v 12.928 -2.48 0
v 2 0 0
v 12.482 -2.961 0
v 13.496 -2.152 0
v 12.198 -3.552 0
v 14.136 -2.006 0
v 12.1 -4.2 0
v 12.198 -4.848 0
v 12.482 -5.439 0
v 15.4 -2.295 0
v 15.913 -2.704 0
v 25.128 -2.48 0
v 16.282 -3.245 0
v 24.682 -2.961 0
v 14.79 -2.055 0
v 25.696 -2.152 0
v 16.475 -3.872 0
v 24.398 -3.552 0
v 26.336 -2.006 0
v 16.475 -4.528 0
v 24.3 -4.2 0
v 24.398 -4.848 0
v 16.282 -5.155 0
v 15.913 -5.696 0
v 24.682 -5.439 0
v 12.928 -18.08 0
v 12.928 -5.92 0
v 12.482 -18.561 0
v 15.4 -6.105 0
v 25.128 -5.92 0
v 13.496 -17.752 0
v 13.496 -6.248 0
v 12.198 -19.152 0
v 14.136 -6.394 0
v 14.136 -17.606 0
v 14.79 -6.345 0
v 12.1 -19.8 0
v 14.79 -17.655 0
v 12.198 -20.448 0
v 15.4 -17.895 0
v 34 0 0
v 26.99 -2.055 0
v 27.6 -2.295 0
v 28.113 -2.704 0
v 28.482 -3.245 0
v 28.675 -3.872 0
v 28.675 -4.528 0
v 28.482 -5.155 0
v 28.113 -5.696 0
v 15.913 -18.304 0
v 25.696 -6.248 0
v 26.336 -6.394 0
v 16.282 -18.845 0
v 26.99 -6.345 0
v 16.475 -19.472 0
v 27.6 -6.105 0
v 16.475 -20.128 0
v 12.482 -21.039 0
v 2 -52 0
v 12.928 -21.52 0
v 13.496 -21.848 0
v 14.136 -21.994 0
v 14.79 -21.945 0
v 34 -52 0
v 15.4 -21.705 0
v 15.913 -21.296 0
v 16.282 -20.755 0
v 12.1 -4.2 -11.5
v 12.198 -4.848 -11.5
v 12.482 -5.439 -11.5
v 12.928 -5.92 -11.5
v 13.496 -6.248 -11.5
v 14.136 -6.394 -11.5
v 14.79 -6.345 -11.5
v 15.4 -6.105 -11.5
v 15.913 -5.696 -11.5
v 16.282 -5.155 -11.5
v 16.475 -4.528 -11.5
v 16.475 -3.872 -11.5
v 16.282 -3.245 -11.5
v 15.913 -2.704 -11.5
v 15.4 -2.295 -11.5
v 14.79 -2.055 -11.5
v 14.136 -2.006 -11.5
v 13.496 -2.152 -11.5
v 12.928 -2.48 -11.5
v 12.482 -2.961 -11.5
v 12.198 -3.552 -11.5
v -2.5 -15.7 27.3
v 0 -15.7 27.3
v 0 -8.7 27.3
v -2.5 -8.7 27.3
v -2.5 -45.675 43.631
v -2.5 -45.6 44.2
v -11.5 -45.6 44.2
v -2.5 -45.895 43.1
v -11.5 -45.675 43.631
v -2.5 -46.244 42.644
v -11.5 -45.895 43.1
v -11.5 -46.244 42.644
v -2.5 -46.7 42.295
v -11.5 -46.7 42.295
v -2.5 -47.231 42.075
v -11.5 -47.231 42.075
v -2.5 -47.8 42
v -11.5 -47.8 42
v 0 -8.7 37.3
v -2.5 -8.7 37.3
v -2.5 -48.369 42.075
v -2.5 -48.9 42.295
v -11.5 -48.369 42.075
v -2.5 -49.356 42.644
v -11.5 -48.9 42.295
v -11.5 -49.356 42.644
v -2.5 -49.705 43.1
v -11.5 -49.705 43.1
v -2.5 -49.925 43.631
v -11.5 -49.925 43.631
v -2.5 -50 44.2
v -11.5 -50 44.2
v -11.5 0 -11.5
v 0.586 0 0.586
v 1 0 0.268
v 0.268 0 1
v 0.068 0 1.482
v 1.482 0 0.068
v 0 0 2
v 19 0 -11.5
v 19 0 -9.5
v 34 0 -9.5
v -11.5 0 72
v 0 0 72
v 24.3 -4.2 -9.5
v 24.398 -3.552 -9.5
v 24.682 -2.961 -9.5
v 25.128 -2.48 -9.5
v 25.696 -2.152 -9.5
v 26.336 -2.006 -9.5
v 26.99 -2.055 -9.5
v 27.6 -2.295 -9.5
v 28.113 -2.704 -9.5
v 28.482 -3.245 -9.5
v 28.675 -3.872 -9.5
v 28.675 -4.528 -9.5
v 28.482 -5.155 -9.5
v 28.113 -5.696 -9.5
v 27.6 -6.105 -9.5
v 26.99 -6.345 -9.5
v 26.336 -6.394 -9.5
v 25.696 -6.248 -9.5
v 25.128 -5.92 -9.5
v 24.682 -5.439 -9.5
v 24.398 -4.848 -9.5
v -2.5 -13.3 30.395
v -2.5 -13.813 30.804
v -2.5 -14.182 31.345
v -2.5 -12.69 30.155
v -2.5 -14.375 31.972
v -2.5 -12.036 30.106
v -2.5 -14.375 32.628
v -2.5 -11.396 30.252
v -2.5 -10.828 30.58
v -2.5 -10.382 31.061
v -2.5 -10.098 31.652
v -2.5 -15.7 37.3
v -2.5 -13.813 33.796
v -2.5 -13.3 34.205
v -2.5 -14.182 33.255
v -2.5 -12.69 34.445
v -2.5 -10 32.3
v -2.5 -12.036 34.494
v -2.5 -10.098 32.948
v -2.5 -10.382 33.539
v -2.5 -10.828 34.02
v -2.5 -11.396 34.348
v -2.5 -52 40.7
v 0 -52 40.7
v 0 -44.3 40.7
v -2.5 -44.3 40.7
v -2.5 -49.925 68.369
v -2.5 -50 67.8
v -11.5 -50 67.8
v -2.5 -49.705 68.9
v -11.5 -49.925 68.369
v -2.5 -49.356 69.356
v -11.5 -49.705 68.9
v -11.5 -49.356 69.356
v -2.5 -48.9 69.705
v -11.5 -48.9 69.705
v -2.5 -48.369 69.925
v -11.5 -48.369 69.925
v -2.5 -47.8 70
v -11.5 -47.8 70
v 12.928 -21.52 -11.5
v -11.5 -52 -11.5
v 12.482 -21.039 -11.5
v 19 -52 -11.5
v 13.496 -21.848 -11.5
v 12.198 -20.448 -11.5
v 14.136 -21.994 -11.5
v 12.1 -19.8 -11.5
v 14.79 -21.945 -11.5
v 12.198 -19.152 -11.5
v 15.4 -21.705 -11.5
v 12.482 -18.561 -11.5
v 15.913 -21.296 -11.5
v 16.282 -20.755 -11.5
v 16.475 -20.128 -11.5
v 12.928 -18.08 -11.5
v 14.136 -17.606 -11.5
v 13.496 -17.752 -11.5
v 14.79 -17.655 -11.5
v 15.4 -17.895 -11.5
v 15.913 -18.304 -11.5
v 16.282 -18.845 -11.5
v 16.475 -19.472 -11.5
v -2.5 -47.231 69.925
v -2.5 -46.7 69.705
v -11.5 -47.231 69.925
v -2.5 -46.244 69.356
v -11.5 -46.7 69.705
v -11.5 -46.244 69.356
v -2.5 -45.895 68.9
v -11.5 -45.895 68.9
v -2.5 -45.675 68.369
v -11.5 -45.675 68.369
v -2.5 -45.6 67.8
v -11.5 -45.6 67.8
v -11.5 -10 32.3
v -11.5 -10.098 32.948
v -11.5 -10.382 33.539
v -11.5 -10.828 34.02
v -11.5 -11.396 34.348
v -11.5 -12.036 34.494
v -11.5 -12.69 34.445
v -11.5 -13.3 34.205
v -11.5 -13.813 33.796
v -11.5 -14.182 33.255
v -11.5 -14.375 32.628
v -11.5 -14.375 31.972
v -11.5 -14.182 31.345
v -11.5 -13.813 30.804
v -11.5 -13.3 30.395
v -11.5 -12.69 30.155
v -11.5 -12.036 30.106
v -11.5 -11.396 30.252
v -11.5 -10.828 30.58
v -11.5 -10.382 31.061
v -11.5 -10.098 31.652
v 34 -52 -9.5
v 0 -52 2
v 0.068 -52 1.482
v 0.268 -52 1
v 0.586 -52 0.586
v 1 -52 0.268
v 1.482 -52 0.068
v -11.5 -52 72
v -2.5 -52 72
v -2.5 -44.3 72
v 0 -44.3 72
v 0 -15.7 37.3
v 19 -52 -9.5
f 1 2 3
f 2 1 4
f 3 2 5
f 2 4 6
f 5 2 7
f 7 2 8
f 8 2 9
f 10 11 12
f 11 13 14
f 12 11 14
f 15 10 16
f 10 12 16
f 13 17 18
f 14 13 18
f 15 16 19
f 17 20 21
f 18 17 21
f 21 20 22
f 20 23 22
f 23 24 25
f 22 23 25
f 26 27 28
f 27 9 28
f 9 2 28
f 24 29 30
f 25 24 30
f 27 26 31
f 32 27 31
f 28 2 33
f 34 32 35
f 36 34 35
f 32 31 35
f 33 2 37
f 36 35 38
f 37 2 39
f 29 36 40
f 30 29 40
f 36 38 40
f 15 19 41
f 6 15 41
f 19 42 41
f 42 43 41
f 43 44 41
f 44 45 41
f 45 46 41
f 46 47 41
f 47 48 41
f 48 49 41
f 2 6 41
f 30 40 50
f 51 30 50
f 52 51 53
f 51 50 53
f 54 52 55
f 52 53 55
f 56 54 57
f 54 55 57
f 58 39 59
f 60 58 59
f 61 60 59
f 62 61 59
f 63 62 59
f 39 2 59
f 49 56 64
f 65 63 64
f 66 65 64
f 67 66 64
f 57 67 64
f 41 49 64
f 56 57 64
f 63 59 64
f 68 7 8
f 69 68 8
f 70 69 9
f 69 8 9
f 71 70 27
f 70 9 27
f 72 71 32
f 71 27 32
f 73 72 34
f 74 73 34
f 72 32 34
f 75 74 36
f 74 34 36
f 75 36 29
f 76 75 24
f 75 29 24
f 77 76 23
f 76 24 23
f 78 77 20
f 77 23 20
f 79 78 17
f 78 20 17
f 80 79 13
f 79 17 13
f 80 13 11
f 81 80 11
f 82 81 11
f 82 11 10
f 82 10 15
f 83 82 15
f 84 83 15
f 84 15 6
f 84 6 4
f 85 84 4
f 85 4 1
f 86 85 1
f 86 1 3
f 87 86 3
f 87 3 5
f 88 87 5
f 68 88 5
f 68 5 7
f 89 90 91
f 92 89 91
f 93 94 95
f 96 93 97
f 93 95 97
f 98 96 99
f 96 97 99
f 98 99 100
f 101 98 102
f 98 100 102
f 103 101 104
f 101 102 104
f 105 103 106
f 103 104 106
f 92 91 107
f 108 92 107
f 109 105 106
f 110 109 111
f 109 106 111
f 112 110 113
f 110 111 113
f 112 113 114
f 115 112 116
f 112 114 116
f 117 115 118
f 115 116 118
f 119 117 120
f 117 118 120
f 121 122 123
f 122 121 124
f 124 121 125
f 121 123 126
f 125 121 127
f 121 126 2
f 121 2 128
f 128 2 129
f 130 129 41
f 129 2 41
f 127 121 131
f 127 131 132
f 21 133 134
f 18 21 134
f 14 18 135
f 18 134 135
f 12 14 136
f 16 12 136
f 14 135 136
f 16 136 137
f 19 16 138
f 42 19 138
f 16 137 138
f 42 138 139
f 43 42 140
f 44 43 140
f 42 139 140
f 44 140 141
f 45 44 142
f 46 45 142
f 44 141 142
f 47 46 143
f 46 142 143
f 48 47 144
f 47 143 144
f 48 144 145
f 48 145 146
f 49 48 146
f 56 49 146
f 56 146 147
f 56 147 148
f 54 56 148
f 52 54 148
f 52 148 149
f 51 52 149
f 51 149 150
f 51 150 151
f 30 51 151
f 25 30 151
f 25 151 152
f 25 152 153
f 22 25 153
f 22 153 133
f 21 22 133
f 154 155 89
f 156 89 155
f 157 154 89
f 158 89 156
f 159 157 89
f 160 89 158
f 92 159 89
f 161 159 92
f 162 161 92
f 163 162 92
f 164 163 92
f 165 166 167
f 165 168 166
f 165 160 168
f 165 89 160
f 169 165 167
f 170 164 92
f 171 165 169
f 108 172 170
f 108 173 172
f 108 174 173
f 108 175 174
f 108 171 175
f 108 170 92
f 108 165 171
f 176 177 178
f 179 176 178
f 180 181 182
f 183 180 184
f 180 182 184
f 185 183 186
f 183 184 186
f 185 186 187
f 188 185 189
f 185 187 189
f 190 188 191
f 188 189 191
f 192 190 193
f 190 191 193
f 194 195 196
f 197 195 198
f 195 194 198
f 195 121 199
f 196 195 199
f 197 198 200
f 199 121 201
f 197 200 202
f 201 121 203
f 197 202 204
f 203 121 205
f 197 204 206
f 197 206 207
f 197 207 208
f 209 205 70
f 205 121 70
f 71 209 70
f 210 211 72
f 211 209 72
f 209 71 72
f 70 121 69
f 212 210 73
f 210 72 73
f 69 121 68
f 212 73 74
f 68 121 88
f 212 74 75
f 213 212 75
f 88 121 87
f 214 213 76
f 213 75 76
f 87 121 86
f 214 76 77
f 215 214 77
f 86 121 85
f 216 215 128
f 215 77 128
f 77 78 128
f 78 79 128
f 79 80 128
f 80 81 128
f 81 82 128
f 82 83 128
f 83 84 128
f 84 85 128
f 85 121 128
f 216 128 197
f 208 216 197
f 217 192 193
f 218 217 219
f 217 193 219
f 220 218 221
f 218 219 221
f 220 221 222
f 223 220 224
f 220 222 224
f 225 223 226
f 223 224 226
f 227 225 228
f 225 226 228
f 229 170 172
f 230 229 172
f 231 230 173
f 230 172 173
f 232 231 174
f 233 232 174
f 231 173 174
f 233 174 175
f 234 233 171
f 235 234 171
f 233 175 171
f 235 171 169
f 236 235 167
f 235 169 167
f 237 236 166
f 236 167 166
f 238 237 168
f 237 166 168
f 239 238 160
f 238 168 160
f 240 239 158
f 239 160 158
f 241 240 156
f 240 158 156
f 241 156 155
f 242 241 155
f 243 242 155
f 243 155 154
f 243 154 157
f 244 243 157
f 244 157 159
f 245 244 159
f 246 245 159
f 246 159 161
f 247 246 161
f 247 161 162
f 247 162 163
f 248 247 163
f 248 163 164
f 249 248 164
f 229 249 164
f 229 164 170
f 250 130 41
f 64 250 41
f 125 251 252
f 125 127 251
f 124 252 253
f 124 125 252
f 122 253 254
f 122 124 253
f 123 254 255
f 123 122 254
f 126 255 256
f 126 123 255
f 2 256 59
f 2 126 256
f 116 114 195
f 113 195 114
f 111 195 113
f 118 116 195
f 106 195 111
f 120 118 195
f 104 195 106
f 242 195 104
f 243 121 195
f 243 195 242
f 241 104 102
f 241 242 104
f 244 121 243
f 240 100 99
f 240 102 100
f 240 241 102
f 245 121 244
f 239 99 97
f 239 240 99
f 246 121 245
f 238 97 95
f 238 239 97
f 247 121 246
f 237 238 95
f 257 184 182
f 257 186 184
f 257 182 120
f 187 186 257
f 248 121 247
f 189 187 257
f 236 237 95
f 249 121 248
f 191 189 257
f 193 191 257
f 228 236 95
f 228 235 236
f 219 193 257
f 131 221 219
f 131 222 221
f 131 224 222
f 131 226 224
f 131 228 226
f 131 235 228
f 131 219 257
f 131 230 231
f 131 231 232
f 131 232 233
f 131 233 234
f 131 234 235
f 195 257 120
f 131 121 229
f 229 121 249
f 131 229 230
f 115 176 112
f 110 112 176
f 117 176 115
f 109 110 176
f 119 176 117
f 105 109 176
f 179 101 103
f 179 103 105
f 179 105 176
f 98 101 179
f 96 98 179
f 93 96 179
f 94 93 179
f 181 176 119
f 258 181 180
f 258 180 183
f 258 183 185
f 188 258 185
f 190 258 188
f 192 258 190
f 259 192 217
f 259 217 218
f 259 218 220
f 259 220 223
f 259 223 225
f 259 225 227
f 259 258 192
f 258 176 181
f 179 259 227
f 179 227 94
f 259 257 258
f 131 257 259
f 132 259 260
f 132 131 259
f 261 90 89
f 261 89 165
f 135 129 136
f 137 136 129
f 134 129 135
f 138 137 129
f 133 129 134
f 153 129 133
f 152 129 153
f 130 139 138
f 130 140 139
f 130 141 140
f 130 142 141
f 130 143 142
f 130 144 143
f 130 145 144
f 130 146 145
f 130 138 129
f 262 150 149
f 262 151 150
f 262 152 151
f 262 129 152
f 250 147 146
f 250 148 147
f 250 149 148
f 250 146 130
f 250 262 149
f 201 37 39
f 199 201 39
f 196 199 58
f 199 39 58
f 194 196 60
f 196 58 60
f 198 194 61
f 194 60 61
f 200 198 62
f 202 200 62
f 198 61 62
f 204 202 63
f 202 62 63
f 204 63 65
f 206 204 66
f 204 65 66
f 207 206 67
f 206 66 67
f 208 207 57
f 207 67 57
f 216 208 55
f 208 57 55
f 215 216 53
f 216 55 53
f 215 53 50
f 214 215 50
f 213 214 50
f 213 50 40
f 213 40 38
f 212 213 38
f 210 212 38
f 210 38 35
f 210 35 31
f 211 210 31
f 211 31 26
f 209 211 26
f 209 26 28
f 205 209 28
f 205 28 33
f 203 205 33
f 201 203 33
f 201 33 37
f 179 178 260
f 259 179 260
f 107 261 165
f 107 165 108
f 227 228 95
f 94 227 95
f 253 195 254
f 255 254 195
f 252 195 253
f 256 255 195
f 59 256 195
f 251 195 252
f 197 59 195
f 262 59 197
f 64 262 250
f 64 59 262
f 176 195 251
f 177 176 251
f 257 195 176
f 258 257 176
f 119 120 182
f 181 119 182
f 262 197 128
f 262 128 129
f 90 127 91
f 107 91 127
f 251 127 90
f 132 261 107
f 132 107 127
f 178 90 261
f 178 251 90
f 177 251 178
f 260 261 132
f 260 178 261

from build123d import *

# Parameters (mm, degrees)
F0_W        = 45.5
F0_H        = 83.5
F1_DEPTH    = 52
F2_W        = 34
F2_H        = 72
F3_DEPTH    = 52.001
F5_W        = 15
F5_H        = 2
F6_DEPTH    = 52.001
F8_R        = 2
F10_D       = 4.4
F10_ON_F9_D = 4.4
F10_ON_F4_D = 4.4
F12_DEPTH   = 45.501
F13_W       = 7
F13_H       = 10
F14_DEPTH   = 2.5
F15_W       = 7.7
F15_H       = 31.3
F16_DEPTH   = 2.5


# Not quite as in the source:
# - a feature names something its author has since deleted; it is built from what else it names


with BuildPart() as f1:
    # F0 (on Front) → F1 (new body)
    with BuildSketch(Plane.XZ):
        with Locations((11.25, 30.25)):
            Rectangle(F0_W, F0_H)
    extrude(amount=F1_DEPTH)

    # F2 (on face) → F3 (cut, through all)
    with BuildSketch(Plane.XZ.offset(52)):
        with Locations((17, 36)):
            Rectangle(F2_W, F2_H)
    extrude(amount=-F3_DEPTH, mode=Mode.SUBTRACT)

    # F5 (on face) → F6 (cut, through all)
    with BuildSketch(Plane.XZ.offset(52)):
        with Locations((26.5, -10.5)):
            Rectangle(F5_W, F5_H)
    extrude(amount=-F6_DEPTH, mode=Mode.SUBTRACT)

    # F8
    f8_edges = [f1.edges().sort_by_distance(p)[0] for p in [
        (0, -26, 0),
    ]]
    fillet(f8_edges, radius=F8_R)

    # F10 (through all)
    with Locations(Plane.XY):
        with Locations((26.5, -4.2)):
            Hole(F10_D / 2)

    # F10 on F9 (through all)
    with Locations(Plane(origin=(-11.5, 0, 0), x_dir=(0, -1, 0), z_dir=(-1, 0, 0))):
        with Locations((12.2, 32.3)):
            Hole(F10_ON_F9_D / 2)

    # F10 on F4 (through all)
    with Locations(Plane(origin=(0, 0, -11.5), x_dir=(1, 0, 0), z_dir=(0, 0, -1))):
        with Locations((14.3, 19.8), (14.3, 4.2)):
            Hole(F10_ON_F4_D / 2)

    # F11 (on face) → F12 (cut, through all)
    with BuildSketch(Plane(origin=(-11.5, 0, 0), x_dir=(0, -1, 0), z_dir=(-1, 0, 0))):
        with BuildLine():
            ThreePointArc((47.8, 70), (46.2443650814, 69.3556349186), (45.6, 67.8))
            Line((45.6, 67.8), (45.6, 44.2))
            ThreePointArc((45.6, 44.2), (46.2443650814, 42.6443650814), (47.8, 42))
            ThreePointArc((47.8, 42), (49.3556349186, 42.6443650814), (50, 44.2))
            Line((50, 44.2), (50, 67.8))
            ThreePointArc((50, 67.8), (49.3556349186, 69.3556349186), (47.8, 70))
        make_face()
    extrude(amount=-F12_DEPTH, mode=Mode.SUBTRACT)

    # F13 (on face) → F14 (cut)
    with BuildSketch(Plane.YZ):
        with Locations((-12.2, 32.3)):
            Rectangle(F13_W, F13_H)
    extrude(amount=-F14_DEPTH, mode=Mode.SUBTRACT)

    # F15 (on face) → F16 (cut)
    with BuildSketch(Plane.YZ):
        with Locations((-48.15, 56.35)):
            Rectangle(F15_W, F15_H)
        with BuildLine():
            Line((-50, 44.2), (-50, 67.8))
            ThreePointArc((-50, 67.8), (-47.8, 70), (-45.6, 67.8))
            Line((-45.6, 67.8), (-45.6, 44.2))
            ThreePointArc((-45.6, 44.2), (-47.8, 42), (-50, 44.2))
        make_face(mode=Mode.SUBTRACT)
    extrude(amount=-F16_DEPTH, mode=Mode.SUBTRACT)


solid = f1.part
